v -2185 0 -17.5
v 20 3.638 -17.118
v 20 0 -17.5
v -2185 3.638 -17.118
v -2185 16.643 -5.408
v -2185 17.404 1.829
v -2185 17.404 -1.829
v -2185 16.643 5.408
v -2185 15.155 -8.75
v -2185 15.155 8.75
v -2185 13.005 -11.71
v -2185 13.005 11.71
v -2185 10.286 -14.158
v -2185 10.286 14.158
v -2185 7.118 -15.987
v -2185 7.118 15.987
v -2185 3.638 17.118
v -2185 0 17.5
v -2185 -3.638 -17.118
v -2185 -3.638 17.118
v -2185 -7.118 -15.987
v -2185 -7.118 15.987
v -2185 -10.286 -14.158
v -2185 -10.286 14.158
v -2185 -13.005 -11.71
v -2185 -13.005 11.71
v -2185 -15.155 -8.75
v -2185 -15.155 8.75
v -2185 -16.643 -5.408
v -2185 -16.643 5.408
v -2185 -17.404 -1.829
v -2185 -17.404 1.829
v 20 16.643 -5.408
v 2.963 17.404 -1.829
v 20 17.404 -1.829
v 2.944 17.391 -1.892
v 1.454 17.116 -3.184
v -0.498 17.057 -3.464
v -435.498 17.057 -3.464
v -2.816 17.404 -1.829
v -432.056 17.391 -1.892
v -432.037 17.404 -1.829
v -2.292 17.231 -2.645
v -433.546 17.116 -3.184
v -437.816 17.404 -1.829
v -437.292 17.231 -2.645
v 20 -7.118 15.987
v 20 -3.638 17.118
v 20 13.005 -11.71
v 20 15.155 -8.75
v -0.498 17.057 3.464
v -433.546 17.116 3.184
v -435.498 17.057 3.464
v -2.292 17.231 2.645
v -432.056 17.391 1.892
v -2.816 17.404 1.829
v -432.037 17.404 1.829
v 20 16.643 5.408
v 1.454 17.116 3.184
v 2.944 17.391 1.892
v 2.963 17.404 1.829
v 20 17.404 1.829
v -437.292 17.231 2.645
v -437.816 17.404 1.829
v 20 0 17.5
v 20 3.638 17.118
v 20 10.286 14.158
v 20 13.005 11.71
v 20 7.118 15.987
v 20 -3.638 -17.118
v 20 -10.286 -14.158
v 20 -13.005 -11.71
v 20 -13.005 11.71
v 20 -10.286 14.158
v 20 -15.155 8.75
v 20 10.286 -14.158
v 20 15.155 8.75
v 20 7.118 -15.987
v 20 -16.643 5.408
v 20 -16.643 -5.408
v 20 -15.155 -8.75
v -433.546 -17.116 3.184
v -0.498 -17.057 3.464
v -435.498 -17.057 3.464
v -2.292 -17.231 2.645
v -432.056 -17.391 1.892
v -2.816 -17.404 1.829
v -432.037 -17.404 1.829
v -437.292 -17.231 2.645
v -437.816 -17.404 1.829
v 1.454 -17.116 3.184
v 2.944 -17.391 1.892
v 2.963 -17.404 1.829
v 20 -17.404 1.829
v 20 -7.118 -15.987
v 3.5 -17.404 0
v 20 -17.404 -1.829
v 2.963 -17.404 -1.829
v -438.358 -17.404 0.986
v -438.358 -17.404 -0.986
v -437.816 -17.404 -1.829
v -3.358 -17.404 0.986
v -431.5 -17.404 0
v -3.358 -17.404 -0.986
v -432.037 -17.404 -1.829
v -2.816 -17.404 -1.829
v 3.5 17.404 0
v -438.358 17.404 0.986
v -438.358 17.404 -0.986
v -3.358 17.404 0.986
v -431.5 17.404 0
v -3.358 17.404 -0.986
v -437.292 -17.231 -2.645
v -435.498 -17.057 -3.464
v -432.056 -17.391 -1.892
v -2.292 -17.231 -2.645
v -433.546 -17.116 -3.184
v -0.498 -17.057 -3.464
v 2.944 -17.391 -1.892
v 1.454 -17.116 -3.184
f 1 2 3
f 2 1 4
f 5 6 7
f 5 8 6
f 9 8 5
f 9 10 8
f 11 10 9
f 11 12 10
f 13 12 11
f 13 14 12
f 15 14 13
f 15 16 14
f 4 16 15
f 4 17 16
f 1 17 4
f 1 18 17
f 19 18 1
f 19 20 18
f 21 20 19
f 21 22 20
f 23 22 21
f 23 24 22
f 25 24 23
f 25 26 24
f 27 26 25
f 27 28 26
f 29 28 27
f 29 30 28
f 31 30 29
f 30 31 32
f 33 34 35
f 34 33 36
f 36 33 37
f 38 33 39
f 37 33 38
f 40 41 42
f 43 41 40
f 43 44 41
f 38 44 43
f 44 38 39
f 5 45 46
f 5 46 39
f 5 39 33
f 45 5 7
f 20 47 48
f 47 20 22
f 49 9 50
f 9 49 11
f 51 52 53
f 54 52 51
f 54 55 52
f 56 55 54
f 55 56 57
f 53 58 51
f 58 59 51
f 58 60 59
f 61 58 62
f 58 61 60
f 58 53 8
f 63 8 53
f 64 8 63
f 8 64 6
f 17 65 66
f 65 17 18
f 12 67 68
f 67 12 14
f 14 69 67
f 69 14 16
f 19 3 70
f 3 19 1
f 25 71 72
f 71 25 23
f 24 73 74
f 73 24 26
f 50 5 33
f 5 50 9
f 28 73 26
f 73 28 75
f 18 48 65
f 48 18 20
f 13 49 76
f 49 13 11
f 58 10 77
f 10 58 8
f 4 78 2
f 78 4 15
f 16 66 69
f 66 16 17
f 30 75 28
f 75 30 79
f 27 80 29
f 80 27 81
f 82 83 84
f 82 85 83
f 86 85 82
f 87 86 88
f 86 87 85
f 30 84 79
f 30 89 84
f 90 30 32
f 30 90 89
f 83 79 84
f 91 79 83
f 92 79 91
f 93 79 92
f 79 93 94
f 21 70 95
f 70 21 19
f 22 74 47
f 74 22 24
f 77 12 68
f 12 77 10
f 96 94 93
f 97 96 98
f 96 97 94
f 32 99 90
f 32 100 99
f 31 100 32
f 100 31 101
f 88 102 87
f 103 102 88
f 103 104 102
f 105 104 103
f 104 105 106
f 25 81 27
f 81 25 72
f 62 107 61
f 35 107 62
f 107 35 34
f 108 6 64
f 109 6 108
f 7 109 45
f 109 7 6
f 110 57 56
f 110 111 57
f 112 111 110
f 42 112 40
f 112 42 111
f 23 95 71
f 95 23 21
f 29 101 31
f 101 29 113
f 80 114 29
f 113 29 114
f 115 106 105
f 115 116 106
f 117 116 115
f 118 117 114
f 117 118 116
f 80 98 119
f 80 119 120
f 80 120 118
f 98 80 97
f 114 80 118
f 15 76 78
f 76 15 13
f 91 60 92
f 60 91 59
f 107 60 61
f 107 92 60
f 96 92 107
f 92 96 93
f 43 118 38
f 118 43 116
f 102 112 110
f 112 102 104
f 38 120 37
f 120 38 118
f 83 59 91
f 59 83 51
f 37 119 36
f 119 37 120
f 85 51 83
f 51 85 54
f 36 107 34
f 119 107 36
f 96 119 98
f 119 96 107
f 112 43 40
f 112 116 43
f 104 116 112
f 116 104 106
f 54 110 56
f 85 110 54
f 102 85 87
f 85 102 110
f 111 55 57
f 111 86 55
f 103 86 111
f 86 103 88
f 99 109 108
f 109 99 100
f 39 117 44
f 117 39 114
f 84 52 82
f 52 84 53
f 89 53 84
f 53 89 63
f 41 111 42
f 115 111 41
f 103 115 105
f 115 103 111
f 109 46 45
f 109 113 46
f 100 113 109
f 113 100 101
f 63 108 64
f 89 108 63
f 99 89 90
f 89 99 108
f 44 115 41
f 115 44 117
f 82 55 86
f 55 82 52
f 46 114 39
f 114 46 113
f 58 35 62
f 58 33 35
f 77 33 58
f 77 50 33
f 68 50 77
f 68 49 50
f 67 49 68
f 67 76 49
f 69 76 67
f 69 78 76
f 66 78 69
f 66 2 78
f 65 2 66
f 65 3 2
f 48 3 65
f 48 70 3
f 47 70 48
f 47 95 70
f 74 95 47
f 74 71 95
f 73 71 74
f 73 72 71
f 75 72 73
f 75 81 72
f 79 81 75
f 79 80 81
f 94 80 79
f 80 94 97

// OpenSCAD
StringerPered();

stringerR = 35/2;
length = 2200;
probkaThk = 5;
shpHoleR = 7/2;
b1 = 15;
b2 = 435;

module StringerPered() {

    color([1,0,0]) 
    translate([b1,0,0])
    rotate([0,90,0]) 
    cylinder(h=probkaThk, r=stringerR);

    difference() {

        translate([b1,0,0])
        rotate([0,-90,0]) 
        cylinder(h=length, r=stringerR);

        rotate([90,0,0]) 
        cylinder(h=2*stringerR+2,r=shpHoleR, center=true);

        translate([-b2,0,0]) 
        rotate([90,0,0]) 
        cylinder(h=2*stringerR+2,r=shpHoleR, center=true);

    }
}
